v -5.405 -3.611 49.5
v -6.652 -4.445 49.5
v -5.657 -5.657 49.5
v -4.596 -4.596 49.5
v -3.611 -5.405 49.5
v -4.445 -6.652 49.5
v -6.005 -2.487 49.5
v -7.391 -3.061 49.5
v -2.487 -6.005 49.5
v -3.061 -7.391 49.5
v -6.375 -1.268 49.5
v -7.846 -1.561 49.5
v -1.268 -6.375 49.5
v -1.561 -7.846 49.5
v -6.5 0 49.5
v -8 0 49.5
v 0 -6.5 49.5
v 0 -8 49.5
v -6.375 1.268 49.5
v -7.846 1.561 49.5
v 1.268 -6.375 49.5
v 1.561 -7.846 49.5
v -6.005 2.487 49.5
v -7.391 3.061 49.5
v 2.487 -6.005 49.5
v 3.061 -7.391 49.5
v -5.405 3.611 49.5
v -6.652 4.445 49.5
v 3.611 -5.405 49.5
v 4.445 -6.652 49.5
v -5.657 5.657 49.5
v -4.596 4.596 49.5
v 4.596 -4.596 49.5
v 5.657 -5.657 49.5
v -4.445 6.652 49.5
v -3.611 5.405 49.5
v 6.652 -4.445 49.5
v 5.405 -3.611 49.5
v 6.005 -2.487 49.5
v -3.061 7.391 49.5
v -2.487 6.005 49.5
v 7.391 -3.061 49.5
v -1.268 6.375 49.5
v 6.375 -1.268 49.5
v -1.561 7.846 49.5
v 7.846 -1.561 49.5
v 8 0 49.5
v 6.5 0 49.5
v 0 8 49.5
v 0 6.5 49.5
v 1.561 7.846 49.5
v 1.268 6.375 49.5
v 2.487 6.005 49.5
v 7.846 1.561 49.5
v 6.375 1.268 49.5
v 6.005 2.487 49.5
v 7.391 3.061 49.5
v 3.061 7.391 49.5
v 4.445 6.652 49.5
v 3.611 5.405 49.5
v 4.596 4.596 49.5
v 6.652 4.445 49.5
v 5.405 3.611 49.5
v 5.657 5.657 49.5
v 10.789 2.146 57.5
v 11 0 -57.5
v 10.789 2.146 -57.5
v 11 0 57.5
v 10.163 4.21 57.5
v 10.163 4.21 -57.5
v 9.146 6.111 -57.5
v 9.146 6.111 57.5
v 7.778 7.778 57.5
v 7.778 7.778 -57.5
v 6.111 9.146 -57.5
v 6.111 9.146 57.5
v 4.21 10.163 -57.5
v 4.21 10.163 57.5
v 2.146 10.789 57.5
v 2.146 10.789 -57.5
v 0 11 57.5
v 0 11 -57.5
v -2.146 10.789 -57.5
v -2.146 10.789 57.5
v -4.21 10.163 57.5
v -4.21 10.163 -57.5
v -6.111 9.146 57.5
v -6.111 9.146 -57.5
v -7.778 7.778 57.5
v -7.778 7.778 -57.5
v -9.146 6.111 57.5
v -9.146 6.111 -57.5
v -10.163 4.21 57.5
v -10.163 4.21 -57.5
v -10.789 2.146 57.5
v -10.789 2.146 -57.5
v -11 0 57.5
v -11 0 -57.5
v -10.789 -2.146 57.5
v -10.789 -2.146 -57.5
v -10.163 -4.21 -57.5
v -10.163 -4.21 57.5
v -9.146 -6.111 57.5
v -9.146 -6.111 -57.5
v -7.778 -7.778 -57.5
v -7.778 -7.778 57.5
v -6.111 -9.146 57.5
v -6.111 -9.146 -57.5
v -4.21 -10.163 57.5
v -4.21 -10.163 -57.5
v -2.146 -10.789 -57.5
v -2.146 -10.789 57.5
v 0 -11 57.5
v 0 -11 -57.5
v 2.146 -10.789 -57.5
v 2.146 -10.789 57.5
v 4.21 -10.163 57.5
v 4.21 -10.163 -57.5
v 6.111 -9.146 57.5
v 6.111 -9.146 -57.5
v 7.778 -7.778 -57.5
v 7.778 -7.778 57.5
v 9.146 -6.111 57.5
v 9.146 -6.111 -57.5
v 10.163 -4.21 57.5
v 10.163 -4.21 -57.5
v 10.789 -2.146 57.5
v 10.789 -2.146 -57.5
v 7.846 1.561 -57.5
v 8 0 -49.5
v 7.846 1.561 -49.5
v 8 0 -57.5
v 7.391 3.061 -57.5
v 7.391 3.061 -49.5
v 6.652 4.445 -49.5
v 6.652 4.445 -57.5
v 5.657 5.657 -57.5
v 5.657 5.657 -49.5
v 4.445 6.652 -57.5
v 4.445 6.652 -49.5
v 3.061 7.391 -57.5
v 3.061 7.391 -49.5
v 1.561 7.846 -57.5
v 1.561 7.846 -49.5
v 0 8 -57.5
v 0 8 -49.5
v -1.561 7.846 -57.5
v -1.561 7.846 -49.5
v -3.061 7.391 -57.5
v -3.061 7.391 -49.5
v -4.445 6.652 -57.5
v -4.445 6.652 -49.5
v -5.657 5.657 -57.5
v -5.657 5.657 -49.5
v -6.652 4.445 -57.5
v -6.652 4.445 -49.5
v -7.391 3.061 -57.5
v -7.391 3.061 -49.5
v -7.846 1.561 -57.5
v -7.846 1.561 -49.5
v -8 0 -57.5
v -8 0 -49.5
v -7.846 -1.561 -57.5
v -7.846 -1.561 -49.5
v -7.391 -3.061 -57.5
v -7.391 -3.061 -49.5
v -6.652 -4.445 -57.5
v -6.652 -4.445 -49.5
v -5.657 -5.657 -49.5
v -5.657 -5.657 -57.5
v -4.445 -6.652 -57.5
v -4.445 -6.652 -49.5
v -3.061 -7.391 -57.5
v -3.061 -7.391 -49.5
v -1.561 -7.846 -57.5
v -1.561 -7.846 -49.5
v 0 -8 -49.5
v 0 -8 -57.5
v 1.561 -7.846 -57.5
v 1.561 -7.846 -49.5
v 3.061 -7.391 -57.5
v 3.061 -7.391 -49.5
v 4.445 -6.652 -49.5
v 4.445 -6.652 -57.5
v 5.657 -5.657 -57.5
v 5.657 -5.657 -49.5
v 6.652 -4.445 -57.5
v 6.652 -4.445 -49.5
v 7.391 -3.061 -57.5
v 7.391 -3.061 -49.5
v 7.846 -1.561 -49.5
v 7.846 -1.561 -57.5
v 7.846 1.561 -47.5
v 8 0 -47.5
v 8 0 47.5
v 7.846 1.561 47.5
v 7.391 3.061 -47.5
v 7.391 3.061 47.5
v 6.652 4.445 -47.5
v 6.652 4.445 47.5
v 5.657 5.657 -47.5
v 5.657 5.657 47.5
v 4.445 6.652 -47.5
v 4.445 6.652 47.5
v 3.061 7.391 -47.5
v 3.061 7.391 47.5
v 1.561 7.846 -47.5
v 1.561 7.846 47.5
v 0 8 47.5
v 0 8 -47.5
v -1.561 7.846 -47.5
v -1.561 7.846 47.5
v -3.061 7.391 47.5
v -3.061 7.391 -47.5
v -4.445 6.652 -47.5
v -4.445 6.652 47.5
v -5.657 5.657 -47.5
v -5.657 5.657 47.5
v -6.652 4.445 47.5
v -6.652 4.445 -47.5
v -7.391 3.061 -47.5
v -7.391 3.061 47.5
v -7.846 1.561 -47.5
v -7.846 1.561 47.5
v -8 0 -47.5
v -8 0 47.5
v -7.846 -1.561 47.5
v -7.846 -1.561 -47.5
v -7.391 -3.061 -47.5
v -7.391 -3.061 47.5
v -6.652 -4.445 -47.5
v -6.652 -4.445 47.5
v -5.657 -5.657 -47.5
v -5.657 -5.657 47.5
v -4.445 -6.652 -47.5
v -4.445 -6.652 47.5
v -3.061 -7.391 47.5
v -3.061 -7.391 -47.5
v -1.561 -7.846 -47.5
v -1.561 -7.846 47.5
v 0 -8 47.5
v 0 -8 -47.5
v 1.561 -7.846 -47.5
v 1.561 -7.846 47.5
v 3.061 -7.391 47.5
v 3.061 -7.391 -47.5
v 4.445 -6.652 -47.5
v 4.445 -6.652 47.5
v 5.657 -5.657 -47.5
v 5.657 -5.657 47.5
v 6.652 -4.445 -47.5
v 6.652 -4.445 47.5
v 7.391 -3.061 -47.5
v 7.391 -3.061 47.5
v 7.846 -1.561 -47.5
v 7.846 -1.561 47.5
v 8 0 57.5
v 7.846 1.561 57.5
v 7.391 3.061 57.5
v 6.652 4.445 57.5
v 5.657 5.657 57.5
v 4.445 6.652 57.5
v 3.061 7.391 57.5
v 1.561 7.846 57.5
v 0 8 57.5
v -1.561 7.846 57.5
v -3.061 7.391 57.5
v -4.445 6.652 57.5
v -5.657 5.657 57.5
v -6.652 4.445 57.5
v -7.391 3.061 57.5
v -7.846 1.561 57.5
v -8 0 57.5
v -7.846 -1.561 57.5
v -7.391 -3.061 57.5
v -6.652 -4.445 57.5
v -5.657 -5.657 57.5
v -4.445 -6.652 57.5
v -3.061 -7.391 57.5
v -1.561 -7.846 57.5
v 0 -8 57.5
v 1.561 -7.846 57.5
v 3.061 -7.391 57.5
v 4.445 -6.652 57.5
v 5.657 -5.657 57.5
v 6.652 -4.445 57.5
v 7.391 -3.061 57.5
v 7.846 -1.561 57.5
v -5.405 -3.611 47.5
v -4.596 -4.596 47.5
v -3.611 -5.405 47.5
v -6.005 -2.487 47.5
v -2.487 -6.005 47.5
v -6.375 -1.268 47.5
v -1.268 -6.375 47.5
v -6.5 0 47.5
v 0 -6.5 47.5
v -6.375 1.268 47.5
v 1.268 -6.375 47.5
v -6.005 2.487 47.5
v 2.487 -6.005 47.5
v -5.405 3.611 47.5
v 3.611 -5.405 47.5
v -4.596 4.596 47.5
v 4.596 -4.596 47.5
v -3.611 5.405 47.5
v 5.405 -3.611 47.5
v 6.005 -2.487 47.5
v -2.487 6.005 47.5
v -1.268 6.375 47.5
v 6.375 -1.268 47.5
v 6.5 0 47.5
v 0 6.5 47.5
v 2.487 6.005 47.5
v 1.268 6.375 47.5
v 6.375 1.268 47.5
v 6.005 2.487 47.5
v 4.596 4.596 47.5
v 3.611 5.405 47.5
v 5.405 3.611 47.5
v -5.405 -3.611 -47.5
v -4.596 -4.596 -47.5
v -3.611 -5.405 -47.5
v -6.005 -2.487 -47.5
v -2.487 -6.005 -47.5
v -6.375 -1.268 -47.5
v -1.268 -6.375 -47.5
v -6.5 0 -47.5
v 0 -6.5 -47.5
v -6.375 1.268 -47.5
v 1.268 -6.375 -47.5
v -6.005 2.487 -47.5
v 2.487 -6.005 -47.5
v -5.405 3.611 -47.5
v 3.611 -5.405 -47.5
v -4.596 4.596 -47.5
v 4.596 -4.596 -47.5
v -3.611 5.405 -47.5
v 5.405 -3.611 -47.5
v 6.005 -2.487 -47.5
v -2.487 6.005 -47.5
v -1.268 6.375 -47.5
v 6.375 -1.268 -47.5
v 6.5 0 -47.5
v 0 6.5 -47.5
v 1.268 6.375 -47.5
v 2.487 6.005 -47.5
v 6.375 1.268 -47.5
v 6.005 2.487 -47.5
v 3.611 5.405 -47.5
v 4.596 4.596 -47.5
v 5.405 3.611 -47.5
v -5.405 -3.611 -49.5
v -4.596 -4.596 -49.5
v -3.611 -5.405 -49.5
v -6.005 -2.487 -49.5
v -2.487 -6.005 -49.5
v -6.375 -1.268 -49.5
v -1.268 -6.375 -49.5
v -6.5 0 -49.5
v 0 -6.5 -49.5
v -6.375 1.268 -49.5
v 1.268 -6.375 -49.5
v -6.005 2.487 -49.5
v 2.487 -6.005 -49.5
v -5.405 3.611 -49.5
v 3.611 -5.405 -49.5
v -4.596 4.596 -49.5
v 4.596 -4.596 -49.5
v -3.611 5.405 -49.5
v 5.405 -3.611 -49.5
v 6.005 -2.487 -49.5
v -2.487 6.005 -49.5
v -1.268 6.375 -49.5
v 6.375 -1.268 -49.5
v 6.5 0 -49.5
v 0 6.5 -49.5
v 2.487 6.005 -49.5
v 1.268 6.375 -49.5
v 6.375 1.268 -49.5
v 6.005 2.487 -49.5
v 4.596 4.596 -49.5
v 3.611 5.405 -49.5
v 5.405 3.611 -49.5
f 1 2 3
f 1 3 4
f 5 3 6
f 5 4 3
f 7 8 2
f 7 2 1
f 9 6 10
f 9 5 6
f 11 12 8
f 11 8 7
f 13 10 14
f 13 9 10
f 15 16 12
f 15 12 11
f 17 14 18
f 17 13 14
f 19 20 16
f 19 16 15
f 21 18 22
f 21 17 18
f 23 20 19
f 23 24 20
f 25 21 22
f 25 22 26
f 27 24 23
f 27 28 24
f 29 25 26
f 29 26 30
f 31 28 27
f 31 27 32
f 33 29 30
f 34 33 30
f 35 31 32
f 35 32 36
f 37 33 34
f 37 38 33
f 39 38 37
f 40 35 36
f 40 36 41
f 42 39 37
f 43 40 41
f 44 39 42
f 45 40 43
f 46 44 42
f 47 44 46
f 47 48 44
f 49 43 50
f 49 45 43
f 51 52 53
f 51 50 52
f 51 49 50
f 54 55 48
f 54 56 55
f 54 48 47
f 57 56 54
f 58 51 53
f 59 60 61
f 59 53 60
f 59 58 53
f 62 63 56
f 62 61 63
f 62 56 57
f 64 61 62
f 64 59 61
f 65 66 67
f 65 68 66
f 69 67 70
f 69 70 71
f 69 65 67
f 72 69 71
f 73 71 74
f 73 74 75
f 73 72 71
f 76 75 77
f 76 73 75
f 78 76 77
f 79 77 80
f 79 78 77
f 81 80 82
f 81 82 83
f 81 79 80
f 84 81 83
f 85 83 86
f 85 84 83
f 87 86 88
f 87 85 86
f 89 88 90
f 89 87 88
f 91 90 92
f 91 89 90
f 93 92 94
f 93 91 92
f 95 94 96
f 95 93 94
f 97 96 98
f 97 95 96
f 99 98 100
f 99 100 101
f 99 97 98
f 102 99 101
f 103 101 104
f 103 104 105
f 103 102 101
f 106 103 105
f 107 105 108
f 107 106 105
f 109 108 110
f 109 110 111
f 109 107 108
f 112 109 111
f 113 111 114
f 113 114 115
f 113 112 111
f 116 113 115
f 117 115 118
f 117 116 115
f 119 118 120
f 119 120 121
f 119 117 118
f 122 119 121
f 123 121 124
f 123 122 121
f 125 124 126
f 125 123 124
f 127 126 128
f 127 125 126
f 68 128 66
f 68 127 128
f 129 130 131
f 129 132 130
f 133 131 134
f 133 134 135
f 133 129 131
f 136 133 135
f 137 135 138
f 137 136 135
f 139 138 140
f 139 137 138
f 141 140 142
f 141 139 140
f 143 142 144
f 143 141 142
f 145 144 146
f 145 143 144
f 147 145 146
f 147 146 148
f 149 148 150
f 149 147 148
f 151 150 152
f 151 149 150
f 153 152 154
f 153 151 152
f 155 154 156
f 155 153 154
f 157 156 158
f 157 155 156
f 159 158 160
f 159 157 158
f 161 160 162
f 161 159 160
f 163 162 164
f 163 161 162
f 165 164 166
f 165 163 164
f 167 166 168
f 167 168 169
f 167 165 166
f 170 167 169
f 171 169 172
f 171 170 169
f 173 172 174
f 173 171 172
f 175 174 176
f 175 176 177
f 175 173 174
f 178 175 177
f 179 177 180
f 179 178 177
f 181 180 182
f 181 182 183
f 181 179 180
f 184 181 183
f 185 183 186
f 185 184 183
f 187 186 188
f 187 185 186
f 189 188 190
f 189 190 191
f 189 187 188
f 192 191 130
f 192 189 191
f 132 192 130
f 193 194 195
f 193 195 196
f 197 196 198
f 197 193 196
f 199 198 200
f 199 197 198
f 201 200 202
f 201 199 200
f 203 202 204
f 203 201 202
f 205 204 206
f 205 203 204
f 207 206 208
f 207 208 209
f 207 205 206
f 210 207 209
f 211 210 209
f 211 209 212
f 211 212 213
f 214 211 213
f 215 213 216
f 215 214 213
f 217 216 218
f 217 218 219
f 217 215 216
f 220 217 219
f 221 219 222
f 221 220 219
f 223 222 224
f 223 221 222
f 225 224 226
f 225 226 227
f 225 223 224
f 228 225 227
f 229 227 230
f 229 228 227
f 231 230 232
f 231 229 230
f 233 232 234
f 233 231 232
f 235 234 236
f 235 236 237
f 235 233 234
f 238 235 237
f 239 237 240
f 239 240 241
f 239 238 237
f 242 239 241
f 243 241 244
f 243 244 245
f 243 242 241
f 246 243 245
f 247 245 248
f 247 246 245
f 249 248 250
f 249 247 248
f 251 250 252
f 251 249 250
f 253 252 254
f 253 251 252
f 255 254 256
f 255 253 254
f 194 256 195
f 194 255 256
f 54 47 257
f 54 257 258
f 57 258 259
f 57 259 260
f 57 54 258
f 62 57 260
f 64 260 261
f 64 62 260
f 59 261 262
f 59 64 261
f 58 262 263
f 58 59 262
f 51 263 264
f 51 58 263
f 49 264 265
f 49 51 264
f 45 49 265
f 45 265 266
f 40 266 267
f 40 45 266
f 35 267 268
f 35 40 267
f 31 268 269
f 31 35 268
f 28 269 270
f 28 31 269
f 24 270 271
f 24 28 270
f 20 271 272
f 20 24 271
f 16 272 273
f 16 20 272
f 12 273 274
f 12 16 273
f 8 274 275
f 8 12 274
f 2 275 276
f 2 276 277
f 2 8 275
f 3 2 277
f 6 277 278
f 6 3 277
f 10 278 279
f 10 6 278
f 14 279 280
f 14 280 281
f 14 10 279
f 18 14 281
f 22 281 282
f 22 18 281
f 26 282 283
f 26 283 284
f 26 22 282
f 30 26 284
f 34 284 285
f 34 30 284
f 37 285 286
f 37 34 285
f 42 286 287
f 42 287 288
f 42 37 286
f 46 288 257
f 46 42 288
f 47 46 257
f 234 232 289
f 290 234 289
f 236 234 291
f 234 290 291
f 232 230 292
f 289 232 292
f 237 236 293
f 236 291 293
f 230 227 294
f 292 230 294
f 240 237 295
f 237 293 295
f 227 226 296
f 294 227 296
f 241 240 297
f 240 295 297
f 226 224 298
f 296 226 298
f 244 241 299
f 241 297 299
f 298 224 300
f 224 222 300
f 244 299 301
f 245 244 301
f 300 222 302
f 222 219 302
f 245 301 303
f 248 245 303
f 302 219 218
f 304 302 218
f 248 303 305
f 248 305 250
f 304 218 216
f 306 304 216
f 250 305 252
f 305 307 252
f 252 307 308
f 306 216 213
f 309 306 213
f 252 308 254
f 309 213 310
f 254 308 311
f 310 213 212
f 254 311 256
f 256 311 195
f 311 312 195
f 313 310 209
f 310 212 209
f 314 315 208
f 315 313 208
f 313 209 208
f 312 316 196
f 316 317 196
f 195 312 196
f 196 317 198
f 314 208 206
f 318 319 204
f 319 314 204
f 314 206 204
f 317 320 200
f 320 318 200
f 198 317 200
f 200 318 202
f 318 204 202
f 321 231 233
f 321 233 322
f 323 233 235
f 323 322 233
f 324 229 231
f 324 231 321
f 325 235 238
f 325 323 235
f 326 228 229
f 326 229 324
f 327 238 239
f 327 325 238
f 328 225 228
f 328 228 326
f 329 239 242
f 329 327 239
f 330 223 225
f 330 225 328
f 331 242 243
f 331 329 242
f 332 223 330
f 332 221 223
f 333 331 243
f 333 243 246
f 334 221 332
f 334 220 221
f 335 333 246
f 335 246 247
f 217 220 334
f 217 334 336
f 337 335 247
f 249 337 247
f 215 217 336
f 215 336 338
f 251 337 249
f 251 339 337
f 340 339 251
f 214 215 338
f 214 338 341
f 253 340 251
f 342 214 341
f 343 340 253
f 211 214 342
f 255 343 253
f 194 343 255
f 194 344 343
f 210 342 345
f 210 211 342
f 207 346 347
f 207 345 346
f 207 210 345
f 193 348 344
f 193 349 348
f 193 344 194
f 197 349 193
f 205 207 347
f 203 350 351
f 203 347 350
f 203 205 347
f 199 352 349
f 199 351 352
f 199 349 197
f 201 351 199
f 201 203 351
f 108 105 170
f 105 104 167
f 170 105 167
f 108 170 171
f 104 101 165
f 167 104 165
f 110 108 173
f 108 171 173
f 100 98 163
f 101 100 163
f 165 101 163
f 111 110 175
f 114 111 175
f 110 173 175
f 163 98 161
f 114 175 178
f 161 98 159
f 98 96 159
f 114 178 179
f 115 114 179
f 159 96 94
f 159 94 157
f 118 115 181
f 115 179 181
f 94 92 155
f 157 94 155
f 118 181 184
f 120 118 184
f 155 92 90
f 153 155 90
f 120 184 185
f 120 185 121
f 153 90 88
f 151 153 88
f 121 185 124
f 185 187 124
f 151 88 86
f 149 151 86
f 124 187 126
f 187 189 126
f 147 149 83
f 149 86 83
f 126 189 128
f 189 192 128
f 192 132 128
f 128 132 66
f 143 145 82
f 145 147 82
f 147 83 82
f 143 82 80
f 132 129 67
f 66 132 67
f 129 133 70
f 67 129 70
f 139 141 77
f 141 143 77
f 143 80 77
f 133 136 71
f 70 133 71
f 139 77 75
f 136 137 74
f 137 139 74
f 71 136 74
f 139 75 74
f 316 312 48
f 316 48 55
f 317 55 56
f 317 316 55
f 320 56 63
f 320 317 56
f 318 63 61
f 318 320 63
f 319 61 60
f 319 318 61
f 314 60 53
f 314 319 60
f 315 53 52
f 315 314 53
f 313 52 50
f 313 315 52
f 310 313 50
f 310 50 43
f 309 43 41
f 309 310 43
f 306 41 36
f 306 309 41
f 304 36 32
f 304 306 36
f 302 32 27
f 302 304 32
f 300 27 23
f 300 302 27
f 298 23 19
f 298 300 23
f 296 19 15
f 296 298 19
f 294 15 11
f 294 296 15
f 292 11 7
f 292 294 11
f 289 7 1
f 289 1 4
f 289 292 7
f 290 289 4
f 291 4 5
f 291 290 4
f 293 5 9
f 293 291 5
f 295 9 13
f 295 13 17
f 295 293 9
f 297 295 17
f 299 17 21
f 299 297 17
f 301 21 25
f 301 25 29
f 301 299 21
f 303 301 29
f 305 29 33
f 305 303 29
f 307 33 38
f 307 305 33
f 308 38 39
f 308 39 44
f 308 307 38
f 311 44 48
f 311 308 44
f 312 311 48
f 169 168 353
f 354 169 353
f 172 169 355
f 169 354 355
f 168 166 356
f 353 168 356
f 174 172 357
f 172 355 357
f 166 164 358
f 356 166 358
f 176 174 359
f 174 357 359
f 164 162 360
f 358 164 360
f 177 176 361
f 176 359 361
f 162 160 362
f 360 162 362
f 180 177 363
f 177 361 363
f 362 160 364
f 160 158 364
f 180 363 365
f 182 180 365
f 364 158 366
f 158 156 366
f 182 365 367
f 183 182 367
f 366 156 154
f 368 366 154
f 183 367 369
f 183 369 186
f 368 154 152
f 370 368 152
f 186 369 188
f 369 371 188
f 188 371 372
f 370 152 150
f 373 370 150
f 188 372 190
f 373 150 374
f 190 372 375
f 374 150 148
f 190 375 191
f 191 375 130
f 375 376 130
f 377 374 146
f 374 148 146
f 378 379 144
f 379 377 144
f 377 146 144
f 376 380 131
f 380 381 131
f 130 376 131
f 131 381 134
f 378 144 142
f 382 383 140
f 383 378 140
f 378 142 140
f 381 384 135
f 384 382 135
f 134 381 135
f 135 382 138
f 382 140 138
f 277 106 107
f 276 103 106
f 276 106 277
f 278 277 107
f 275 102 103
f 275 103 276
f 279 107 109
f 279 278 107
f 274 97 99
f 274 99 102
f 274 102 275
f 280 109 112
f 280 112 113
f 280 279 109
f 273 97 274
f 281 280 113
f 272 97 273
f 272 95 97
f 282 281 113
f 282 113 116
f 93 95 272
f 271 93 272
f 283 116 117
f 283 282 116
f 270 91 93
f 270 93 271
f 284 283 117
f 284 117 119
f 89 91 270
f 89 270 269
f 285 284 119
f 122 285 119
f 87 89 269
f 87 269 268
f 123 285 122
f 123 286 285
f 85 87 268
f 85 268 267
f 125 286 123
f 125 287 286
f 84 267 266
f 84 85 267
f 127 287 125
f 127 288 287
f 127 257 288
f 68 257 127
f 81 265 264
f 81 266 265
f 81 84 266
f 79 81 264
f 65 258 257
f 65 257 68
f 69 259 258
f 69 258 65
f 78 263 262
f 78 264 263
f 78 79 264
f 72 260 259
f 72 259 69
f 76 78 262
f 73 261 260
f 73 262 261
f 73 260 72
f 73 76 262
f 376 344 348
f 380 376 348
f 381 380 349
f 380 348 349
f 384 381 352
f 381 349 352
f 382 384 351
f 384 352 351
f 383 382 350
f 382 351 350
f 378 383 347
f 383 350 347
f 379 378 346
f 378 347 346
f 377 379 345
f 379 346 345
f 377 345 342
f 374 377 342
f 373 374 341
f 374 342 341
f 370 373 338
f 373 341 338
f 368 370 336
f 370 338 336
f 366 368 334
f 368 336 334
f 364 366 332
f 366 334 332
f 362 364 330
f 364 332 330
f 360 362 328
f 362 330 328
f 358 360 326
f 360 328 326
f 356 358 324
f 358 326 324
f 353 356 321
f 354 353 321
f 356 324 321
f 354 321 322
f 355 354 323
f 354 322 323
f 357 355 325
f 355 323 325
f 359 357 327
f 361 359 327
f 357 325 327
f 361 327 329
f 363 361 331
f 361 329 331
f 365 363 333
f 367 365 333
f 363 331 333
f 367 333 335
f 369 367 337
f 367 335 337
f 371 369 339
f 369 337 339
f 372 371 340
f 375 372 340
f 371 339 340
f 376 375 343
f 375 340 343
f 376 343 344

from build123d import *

# Parameters (mm, degrees)
SKETCH1_R           = 11
SKETCH1_R_2         = 8
BOSS_EXTRUDE1_DEPTH = 57.5
BOSS_EXTRUDE2_START = 47.5
SKETCH2_R           = 8
SKETCH2_R_2         = 6.5
BOSS_EXTRUDE2_DEPTH = 2


with BuildPart() as part:
    # Sketch1 → Boss-Extrude1 (new, symmetric)
    with BuildSketch(Plane.XY):
        Circle(SKETCH1_R)
        Circle(SKETCH1_R_2, mode=Mode.SUBTRACT)
    extrude(amount=BOSS_EXTRUDE1_DEPTH, both=True)

    # Sketch2 → Boss-Extrude2 (add)
    with BuildSketch(Plane.XY.offset(BOSS_EXTRUDE2_START)):
        Circle(SKETCH2_R)
        Circle(SKETCH2_R_2, mode=Mode.SUBTRACT)
    boss_extrude2 = extrude(amount=BOSS_EXTRUDE2_DEPTH)

    # Mirror1: Boss-Extrude2 across plane
    add(boss_extrude2.mirror(Plane.XY))


solid = part.part
